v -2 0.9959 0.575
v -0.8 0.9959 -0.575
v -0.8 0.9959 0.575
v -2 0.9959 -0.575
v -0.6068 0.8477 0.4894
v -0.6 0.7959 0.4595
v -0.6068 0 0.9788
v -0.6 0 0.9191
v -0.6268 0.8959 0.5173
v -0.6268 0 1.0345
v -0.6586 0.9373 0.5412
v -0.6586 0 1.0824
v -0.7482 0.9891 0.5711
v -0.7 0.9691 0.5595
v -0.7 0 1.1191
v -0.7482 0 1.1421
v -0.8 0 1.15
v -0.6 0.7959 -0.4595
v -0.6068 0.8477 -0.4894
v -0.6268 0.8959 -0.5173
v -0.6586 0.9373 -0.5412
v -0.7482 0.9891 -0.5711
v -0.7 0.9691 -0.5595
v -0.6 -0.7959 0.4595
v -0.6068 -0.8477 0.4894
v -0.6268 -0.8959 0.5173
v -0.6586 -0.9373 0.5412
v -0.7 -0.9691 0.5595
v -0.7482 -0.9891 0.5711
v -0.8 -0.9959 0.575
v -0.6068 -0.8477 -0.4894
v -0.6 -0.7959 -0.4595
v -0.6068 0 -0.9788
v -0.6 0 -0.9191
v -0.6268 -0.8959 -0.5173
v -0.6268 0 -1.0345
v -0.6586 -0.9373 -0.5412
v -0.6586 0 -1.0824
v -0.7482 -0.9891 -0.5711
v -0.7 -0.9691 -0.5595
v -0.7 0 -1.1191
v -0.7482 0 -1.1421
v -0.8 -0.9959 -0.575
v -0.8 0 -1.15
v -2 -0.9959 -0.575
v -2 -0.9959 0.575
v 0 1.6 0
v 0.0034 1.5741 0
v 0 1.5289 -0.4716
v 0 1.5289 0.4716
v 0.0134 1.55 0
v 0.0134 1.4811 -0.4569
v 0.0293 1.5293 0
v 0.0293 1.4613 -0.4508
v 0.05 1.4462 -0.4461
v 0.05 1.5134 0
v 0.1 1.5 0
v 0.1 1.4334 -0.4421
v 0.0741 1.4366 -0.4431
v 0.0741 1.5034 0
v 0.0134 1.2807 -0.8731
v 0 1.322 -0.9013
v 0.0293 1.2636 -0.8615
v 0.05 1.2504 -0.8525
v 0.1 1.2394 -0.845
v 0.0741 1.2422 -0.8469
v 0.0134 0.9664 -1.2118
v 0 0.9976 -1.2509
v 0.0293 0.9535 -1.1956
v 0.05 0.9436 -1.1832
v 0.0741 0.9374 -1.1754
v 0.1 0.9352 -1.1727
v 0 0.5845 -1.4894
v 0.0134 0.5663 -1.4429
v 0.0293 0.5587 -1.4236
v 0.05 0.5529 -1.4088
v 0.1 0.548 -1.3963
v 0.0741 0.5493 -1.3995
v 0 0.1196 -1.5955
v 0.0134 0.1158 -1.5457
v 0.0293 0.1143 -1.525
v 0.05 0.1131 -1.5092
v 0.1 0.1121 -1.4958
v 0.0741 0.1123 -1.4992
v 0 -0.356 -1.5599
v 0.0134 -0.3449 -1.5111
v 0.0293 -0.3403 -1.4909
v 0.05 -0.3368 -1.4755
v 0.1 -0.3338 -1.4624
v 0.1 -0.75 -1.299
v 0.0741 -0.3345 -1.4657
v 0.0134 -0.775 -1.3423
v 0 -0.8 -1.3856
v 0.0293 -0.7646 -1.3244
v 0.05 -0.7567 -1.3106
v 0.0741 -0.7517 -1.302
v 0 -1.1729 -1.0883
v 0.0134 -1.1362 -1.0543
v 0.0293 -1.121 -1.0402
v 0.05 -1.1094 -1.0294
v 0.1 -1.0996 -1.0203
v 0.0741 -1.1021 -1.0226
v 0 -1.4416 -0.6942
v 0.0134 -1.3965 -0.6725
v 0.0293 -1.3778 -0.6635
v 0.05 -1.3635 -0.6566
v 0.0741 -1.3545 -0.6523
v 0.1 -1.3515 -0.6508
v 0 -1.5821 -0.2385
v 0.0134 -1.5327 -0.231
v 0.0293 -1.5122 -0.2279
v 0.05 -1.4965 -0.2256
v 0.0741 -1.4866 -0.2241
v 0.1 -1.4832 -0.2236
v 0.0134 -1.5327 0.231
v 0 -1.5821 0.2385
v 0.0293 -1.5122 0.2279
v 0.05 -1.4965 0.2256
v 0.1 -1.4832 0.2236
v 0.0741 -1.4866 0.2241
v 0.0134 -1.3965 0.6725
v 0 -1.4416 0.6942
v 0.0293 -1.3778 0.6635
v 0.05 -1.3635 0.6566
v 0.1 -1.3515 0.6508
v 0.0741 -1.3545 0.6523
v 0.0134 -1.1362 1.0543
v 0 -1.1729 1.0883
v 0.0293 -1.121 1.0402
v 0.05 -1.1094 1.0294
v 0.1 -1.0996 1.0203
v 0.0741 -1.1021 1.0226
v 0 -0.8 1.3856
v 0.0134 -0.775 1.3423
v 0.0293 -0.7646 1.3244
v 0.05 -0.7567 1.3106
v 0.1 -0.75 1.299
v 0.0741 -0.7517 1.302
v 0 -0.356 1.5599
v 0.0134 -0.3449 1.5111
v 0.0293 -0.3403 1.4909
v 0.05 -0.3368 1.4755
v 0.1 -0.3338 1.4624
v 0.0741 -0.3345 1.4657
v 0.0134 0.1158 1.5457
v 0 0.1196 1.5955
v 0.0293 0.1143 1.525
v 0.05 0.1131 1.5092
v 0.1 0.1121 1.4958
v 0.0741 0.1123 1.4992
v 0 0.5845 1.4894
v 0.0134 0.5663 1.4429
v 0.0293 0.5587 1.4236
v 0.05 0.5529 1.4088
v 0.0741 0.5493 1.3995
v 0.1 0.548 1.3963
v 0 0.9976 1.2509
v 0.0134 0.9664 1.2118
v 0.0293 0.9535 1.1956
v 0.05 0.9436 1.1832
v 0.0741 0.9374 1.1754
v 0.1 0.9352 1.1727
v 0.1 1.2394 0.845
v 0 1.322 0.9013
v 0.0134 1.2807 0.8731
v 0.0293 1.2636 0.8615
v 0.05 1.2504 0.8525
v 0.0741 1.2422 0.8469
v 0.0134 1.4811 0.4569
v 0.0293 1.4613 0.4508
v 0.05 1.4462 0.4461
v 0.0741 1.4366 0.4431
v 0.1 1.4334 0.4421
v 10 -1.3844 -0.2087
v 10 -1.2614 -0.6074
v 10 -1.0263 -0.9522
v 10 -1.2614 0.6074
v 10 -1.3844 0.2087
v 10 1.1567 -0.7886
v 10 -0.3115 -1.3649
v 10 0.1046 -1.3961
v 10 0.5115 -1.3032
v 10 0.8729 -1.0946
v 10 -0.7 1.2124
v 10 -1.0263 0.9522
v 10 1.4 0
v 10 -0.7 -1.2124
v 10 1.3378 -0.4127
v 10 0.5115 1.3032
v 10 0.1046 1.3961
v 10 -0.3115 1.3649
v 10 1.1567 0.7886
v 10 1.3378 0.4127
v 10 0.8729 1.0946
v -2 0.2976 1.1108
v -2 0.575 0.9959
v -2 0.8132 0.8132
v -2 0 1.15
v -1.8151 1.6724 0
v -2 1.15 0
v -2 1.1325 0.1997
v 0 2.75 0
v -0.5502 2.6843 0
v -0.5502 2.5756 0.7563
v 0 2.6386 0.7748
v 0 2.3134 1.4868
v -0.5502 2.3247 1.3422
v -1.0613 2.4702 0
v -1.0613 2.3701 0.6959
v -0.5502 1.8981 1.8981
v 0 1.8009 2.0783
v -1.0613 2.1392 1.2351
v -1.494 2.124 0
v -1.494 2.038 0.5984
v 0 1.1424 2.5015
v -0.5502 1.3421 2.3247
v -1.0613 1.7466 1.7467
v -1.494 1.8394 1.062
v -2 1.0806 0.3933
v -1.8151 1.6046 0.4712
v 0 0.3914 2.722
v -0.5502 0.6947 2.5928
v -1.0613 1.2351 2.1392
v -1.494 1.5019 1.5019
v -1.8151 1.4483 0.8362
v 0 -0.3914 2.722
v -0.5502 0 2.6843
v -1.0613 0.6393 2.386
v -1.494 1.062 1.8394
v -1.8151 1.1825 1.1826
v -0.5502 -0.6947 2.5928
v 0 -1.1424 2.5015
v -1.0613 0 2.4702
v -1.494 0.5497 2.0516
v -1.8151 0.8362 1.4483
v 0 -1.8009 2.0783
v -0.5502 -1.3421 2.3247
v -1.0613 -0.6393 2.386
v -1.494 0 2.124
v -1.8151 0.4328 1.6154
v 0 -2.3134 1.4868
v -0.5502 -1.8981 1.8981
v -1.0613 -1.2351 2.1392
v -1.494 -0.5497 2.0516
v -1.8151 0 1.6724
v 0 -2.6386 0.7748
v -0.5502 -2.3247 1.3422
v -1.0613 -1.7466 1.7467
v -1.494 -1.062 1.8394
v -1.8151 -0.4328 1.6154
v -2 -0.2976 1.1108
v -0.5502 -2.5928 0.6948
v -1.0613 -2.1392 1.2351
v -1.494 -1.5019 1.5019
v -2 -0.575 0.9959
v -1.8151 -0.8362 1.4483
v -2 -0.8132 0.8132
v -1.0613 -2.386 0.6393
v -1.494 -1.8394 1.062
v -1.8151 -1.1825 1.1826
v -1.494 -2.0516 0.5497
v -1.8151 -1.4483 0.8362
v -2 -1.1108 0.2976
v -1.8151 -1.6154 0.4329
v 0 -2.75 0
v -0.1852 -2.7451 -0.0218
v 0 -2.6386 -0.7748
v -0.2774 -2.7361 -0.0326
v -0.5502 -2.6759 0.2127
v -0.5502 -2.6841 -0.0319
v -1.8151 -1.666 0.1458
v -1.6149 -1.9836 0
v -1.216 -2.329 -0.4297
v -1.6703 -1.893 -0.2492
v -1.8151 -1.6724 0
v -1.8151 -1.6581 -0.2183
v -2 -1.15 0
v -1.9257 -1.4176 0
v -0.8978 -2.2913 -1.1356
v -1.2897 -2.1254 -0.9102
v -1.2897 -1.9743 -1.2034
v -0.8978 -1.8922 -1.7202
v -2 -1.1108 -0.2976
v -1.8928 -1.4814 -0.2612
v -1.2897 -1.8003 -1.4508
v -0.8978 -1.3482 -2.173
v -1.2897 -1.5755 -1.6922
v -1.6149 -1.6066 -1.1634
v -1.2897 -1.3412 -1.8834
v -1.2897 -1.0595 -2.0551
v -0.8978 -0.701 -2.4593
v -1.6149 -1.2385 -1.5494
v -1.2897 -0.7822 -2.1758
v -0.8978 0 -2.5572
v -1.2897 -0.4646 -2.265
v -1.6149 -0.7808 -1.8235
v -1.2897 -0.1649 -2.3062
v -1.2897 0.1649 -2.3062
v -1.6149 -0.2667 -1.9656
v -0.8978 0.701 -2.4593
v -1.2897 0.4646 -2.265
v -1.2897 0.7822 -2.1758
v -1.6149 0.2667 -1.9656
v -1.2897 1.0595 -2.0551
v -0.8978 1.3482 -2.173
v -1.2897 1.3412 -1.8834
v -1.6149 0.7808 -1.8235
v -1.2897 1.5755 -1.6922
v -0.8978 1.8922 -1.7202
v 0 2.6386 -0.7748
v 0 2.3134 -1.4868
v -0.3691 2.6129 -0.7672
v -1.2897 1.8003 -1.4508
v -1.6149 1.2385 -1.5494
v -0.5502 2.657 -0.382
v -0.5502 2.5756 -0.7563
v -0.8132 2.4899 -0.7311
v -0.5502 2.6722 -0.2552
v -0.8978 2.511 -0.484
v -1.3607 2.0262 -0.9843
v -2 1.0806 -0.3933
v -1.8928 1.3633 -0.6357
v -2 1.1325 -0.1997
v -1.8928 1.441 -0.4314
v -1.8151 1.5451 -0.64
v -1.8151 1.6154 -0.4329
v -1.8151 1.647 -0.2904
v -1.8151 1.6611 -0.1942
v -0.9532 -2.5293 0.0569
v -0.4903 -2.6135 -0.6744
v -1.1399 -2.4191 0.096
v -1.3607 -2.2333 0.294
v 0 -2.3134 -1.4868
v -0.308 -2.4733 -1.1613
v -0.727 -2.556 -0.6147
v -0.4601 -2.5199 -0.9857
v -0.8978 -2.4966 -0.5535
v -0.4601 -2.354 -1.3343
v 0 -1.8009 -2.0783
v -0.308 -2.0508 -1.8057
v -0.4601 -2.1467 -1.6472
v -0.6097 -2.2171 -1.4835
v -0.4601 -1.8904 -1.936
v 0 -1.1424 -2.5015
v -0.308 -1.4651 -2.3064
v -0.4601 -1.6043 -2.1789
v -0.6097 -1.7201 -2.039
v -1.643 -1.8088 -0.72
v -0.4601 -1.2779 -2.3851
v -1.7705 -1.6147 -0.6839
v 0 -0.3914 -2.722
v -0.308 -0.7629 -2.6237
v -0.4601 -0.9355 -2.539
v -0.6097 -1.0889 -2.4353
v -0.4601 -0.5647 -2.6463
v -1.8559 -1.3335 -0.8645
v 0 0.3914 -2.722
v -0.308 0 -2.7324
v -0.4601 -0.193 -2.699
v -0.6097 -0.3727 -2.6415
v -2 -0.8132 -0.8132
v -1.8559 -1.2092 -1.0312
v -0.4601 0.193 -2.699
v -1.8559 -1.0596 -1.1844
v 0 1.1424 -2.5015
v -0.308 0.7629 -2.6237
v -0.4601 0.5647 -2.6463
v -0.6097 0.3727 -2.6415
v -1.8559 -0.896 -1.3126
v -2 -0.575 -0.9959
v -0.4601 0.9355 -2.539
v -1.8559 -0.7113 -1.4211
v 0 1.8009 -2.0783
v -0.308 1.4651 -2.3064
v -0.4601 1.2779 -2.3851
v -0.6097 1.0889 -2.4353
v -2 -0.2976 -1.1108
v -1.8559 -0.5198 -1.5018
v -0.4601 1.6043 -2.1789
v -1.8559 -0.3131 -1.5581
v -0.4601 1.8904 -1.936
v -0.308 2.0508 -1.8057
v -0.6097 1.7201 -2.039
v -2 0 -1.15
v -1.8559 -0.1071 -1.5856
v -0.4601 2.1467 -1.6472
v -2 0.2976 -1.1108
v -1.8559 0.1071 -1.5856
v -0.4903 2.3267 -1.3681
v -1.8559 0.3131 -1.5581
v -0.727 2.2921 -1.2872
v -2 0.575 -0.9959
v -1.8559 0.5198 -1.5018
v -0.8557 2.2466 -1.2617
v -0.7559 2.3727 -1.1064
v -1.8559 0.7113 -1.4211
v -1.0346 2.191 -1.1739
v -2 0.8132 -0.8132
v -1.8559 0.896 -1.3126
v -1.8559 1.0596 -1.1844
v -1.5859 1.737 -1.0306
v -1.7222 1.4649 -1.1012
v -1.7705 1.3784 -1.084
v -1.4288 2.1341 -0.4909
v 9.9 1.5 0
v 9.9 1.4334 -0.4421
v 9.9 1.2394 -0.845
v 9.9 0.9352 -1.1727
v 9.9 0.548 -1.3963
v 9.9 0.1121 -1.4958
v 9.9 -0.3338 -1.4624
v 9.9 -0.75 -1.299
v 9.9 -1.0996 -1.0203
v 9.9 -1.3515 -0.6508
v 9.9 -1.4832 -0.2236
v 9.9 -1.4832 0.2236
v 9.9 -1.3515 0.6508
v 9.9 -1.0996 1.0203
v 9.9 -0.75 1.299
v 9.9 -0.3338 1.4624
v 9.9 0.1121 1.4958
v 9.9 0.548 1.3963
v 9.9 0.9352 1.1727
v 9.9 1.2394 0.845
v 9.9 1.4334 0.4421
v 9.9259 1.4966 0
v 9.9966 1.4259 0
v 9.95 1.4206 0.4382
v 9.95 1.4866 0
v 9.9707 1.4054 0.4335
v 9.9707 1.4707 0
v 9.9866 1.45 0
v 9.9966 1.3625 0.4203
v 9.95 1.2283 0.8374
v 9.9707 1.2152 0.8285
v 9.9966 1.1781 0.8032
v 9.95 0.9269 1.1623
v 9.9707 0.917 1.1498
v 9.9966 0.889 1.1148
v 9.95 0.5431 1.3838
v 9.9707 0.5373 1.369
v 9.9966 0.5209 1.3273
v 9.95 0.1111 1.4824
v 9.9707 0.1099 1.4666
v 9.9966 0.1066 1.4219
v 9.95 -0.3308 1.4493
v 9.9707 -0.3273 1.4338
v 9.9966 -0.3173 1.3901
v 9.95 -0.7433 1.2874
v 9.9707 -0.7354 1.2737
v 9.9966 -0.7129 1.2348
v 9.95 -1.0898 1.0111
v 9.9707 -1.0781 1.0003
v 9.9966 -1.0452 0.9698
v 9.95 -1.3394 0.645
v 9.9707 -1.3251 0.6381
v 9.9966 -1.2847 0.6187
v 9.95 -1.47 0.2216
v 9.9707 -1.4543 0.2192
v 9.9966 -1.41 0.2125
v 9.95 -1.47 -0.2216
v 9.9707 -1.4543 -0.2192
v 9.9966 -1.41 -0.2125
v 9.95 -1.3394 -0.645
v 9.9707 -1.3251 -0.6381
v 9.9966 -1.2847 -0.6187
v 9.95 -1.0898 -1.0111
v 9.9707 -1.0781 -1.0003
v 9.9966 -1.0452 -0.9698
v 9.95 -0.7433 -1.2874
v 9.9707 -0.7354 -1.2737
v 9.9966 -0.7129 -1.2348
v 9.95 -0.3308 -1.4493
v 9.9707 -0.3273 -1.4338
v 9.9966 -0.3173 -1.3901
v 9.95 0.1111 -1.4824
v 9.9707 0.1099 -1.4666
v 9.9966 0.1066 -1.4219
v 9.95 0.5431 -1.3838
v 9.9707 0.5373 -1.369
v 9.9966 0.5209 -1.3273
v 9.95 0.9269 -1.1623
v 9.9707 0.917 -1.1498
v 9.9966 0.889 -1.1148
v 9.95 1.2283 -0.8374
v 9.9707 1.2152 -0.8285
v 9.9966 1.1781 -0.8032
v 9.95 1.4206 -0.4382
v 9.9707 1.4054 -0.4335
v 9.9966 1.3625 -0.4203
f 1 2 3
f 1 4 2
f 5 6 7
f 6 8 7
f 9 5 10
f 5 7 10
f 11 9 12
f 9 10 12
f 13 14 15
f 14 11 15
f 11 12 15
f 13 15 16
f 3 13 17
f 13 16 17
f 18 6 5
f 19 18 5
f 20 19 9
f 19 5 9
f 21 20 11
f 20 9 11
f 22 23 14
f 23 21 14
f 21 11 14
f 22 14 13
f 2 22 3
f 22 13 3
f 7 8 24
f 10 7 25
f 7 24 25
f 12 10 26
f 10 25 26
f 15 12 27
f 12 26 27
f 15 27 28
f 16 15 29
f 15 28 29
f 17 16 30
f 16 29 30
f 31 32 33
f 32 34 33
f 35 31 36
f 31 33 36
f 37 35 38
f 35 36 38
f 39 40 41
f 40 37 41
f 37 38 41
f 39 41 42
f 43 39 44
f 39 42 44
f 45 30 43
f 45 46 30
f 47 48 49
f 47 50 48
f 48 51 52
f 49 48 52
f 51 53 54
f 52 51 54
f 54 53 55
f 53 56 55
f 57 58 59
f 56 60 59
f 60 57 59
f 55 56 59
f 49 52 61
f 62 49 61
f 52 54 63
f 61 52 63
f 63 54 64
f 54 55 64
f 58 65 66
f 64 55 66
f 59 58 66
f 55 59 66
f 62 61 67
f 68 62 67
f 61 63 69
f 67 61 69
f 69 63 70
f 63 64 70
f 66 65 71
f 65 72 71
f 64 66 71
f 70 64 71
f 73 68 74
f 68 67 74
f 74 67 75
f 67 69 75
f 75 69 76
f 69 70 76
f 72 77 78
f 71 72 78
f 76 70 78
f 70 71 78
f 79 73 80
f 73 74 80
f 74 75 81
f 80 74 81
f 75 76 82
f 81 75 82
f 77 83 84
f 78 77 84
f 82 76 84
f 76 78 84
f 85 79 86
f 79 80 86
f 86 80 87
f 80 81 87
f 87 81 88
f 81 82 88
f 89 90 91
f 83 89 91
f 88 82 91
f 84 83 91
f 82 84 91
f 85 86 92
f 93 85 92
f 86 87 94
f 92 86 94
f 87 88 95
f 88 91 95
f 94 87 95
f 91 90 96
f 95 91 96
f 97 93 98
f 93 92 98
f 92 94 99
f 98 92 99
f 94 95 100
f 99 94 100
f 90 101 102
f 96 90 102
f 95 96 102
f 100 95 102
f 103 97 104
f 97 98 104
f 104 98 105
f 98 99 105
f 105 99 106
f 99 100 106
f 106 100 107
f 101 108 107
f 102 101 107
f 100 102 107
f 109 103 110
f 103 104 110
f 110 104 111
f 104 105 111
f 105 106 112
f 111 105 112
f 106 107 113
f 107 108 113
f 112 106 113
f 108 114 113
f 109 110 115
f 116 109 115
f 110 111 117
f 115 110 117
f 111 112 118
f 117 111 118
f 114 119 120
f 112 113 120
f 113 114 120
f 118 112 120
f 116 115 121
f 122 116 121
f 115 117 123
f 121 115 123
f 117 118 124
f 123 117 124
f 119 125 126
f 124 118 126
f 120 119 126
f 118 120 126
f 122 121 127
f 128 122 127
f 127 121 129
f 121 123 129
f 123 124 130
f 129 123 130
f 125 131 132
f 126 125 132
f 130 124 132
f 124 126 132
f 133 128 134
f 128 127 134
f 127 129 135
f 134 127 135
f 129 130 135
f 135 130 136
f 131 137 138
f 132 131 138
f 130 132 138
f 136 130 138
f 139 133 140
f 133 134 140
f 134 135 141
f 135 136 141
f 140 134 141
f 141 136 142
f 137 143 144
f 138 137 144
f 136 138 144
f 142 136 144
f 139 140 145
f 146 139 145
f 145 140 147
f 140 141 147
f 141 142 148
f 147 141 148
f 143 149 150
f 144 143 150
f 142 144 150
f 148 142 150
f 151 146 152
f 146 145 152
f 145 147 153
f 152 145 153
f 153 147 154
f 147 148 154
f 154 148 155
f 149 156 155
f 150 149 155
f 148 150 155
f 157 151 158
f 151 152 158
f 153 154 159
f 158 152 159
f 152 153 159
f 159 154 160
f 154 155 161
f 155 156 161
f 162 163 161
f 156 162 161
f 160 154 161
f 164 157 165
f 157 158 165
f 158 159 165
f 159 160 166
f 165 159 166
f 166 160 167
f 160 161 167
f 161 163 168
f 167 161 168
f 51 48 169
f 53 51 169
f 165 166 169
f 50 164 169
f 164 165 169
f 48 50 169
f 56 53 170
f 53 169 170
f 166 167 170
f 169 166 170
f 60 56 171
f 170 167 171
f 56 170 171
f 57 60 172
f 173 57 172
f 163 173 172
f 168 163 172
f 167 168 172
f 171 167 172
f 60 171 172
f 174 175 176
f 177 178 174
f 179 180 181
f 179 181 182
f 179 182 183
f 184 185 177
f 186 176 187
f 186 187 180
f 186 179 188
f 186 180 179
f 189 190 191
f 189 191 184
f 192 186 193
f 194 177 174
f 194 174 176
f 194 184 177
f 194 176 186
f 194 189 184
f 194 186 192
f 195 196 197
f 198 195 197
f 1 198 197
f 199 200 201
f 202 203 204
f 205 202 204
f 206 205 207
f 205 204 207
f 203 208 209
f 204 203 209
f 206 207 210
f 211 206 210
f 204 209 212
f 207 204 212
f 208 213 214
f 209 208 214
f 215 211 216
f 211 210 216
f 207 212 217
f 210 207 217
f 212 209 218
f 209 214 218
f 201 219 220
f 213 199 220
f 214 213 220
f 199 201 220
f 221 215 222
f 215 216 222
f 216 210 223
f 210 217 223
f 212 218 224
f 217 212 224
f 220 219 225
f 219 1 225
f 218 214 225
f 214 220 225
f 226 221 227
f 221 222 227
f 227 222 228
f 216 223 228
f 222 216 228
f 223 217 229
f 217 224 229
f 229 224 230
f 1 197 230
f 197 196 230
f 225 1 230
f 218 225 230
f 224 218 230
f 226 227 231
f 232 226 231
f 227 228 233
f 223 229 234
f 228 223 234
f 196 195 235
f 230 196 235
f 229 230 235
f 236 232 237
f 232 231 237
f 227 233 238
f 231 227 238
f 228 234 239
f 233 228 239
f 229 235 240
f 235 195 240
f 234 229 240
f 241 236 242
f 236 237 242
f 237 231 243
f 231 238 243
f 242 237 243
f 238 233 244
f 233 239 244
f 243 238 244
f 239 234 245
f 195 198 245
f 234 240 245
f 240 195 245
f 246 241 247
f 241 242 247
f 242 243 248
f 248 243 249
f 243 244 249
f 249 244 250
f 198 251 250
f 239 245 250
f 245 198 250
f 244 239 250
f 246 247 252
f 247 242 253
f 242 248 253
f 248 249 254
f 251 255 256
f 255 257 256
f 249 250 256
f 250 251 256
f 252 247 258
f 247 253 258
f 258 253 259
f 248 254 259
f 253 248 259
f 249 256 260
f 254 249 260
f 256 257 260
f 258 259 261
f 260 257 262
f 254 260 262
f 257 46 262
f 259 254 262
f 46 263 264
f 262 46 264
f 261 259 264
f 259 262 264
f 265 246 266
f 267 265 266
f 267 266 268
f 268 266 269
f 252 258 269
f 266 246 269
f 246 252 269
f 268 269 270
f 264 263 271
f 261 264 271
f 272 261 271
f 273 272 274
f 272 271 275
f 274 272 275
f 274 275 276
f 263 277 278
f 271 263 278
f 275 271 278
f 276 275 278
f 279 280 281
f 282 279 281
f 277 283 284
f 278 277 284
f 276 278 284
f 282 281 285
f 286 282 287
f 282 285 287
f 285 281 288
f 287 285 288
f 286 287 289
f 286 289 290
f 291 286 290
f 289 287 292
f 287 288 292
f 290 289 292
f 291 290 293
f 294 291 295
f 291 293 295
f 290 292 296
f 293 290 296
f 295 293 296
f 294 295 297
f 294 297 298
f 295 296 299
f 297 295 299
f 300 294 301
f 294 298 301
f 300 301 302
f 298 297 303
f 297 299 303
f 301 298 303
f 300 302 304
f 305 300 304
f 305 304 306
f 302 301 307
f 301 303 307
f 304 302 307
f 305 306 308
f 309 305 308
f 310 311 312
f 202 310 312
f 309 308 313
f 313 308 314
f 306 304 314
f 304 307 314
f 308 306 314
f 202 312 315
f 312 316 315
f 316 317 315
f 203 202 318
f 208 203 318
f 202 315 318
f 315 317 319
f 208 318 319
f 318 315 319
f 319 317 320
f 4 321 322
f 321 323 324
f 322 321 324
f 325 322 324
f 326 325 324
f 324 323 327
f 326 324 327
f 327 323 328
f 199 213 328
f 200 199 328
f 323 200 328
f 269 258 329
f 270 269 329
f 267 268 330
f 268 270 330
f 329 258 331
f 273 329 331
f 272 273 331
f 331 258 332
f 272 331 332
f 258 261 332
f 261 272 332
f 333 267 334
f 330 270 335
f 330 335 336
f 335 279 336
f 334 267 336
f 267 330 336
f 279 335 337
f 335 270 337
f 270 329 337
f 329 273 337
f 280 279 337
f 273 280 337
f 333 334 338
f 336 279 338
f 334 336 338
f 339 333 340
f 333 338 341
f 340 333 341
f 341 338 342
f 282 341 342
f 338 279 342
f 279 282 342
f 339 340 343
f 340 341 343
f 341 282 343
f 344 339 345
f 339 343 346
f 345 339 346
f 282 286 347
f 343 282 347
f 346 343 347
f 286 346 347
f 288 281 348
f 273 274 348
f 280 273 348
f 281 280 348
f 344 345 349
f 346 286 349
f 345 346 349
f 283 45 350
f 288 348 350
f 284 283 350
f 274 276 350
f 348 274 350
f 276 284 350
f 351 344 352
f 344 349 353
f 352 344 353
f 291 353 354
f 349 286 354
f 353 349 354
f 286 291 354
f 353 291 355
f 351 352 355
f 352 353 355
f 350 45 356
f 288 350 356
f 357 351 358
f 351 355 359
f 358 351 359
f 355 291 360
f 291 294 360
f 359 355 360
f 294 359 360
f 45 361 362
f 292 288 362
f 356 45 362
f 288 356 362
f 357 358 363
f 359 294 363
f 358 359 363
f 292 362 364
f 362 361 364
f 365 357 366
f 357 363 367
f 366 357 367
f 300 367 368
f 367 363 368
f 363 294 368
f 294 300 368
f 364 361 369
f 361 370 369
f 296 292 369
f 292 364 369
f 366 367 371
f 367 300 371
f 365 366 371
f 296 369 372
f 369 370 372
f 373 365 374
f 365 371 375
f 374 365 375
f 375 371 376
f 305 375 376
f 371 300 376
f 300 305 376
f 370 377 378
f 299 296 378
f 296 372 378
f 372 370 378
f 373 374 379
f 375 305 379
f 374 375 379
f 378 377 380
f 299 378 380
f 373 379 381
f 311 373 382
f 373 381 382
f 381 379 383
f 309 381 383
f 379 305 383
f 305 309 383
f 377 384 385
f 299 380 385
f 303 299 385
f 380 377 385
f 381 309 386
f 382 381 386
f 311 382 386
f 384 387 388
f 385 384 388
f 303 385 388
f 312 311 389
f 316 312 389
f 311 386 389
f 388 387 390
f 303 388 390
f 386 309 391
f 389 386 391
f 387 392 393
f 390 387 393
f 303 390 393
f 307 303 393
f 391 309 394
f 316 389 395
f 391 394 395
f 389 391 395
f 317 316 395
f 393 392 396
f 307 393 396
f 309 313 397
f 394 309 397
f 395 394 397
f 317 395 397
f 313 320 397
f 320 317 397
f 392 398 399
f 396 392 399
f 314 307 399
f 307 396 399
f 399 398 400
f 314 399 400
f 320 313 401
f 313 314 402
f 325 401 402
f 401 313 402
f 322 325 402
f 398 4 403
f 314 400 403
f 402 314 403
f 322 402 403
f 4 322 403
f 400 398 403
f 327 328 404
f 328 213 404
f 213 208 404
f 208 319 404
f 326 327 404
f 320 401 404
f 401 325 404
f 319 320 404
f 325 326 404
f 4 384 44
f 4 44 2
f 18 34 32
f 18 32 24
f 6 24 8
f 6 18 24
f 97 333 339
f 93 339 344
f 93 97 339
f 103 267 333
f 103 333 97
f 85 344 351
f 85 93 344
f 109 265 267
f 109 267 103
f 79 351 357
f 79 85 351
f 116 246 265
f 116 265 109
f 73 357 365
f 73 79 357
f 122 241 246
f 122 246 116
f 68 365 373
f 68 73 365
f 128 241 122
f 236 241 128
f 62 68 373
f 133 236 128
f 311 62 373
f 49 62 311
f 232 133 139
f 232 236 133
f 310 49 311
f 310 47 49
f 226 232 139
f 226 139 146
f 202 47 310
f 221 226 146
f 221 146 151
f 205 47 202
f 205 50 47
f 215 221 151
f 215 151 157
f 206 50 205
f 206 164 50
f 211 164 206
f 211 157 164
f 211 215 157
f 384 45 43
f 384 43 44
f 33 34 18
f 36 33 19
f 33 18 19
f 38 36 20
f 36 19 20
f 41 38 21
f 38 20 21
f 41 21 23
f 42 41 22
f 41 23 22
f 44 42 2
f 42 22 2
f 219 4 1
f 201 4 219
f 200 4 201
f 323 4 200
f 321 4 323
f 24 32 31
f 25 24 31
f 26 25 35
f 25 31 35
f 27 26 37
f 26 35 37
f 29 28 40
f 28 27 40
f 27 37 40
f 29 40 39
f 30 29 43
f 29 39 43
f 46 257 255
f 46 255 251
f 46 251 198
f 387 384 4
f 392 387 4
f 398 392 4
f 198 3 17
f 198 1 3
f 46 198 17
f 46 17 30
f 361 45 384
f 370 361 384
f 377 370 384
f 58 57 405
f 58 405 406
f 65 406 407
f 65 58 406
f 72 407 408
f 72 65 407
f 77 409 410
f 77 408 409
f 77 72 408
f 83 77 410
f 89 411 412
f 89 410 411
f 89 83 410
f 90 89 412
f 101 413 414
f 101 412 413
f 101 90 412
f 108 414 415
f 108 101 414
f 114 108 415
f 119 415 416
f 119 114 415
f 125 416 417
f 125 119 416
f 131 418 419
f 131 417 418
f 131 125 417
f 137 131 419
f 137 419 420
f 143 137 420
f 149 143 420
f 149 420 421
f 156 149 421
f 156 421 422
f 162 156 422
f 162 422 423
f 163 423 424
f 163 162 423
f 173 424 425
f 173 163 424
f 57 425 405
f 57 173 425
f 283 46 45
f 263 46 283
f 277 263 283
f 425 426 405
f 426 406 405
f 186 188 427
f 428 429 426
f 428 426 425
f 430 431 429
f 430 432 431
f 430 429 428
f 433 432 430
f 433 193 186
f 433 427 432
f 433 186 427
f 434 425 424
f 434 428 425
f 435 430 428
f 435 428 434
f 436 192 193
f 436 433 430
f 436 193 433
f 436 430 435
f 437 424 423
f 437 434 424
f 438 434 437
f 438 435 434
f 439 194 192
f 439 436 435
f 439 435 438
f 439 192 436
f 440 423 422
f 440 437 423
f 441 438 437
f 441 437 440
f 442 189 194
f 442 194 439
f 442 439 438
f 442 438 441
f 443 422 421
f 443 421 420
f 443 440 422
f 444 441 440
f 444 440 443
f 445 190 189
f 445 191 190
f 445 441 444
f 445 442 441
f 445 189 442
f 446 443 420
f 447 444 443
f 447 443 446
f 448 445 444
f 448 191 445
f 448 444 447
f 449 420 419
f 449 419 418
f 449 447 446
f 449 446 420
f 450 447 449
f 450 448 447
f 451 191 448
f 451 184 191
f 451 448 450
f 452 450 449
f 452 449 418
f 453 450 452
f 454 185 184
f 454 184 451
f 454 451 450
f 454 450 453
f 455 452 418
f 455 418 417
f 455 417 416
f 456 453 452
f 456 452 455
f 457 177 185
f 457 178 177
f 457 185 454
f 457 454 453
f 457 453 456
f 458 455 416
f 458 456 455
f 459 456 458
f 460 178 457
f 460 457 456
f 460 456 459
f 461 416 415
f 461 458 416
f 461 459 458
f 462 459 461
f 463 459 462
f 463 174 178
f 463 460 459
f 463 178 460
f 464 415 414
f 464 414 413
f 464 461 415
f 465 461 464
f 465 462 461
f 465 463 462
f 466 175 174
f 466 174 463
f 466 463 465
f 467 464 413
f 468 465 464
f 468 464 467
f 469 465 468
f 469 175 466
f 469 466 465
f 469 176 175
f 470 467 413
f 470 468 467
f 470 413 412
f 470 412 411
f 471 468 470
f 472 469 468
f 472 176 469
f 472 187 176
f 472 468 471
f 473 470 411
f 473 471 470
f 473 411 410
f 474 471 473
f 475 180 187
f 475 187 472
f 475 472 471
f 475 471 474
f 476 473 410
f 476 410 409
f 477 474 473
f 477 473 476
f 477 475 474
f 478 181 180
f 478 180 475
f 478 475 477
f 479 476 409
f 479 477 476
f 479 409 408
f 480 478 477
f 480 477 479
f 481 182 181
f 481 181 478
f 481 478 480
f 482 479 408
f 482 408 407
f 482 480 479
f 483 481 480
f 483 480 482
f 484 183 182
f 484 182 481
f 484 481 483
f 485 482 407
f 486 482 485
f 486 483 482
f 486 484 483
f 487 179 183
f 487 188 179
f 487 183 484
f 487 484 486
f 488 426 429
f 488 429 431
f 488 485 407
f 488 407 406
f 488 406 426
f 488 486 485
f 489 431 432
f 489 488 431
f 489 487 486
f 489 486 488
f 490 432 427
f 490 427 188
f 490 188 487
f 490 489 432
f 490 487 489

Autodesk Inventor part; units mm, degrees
ref_plane "YZ Plane" through (0, 0, 0) normal (1, 0, 0) x (0, 1, 0)
ref_plane "XZ Plane" through (0, 0, 0) normal (0, 1, 0) x (-1, 0, 0)
ref_plane "XY Plane" through (0, 0, 0) normal (0, 0, 1) x (1, 0, 0)
sketch "スケッチ1" plane through (0, 0, 0) normal (0, 0, 1) x (1, 0, 0)
  line L0 (0, 0) -> (10, 0)
  line L1 (10, 0) -> (10, 1.5)
  line L2 (10, 1.5) -> (0, 1.5)
  line L3 (0, 1.5) -> (0, 0)
  line L4 (0, 0) -> (0, 2.75)
  line L5 (0, 0) -> (-2, 0)
  line L6 (-2, 0) -> (0, 0)
  line L7 (-2, 0) -> (-2, 1.15)
  arc A0 (0, 2.75) -> (-2, 1.15) centre (-0.0403, 0.7504) ccw
  dimension "d0" = 1.5
  dimension "d1" = 10
  dimension "d3" = 2
  dimension "d4" = 2.75
  dimension "d5" = 1.15
  dimension "d6" = 2
revolve "回転1" add sketch "スケッチ1" angle 360 about axis through (-2, 0, 0) along (1, 0, 0)
thread "ねじ1" size "M3x0.5" class "6g" standard "ANSI Metric M Profile" length 100
sketch "スケッチ2" plane through (-2, 0, 0) normal (-1, 0, 0) x (0, 0, 1)
  circle A0 centre (0, 0) radius 1.15 projected
  line L0 (-0.575, 0.9959) -> (0.575, 0.9959)
  line L1 (0.575, 0.9959) -> (1.15, 0)
  line L2 (1.15, 0) -> (0.575, -0.9959)
  line L3 (0.575, -0.9959) -> (-0.575, -0.9959)
  line L4 (-0.575, -0.9959) -> (-1.15, 0)
  line L5 (-1.15, 0) -> (-0.575, 0.9959)
  dimension "d10" = 1.15
  dimension "d11" = 1.9919
extrude "押し出し1" cut sketch "スケッチ2" against normal blind 1.4 contours L2 L3 L4 L5 L0 L1
fillet "フィレット1" radius 0.2 6 edges at (-0.6, 0.9959, 0) (-0.6, 0.498, 0.8625) (-0.6, 0.498, -0.8625) (-0.6, -0.498, -0.8625) (-0.6, -0.9959, 0) (-0.6, -0.498, 0.8625)
fillet "フィレット2" radius 0.1 1 edges at (0, -1.5, 0)
fillet "フィレット3" radius 0.1 1 edges at (10, -1.5, 0)
properties part number "ネジボタンM3L10" material "鋼"
